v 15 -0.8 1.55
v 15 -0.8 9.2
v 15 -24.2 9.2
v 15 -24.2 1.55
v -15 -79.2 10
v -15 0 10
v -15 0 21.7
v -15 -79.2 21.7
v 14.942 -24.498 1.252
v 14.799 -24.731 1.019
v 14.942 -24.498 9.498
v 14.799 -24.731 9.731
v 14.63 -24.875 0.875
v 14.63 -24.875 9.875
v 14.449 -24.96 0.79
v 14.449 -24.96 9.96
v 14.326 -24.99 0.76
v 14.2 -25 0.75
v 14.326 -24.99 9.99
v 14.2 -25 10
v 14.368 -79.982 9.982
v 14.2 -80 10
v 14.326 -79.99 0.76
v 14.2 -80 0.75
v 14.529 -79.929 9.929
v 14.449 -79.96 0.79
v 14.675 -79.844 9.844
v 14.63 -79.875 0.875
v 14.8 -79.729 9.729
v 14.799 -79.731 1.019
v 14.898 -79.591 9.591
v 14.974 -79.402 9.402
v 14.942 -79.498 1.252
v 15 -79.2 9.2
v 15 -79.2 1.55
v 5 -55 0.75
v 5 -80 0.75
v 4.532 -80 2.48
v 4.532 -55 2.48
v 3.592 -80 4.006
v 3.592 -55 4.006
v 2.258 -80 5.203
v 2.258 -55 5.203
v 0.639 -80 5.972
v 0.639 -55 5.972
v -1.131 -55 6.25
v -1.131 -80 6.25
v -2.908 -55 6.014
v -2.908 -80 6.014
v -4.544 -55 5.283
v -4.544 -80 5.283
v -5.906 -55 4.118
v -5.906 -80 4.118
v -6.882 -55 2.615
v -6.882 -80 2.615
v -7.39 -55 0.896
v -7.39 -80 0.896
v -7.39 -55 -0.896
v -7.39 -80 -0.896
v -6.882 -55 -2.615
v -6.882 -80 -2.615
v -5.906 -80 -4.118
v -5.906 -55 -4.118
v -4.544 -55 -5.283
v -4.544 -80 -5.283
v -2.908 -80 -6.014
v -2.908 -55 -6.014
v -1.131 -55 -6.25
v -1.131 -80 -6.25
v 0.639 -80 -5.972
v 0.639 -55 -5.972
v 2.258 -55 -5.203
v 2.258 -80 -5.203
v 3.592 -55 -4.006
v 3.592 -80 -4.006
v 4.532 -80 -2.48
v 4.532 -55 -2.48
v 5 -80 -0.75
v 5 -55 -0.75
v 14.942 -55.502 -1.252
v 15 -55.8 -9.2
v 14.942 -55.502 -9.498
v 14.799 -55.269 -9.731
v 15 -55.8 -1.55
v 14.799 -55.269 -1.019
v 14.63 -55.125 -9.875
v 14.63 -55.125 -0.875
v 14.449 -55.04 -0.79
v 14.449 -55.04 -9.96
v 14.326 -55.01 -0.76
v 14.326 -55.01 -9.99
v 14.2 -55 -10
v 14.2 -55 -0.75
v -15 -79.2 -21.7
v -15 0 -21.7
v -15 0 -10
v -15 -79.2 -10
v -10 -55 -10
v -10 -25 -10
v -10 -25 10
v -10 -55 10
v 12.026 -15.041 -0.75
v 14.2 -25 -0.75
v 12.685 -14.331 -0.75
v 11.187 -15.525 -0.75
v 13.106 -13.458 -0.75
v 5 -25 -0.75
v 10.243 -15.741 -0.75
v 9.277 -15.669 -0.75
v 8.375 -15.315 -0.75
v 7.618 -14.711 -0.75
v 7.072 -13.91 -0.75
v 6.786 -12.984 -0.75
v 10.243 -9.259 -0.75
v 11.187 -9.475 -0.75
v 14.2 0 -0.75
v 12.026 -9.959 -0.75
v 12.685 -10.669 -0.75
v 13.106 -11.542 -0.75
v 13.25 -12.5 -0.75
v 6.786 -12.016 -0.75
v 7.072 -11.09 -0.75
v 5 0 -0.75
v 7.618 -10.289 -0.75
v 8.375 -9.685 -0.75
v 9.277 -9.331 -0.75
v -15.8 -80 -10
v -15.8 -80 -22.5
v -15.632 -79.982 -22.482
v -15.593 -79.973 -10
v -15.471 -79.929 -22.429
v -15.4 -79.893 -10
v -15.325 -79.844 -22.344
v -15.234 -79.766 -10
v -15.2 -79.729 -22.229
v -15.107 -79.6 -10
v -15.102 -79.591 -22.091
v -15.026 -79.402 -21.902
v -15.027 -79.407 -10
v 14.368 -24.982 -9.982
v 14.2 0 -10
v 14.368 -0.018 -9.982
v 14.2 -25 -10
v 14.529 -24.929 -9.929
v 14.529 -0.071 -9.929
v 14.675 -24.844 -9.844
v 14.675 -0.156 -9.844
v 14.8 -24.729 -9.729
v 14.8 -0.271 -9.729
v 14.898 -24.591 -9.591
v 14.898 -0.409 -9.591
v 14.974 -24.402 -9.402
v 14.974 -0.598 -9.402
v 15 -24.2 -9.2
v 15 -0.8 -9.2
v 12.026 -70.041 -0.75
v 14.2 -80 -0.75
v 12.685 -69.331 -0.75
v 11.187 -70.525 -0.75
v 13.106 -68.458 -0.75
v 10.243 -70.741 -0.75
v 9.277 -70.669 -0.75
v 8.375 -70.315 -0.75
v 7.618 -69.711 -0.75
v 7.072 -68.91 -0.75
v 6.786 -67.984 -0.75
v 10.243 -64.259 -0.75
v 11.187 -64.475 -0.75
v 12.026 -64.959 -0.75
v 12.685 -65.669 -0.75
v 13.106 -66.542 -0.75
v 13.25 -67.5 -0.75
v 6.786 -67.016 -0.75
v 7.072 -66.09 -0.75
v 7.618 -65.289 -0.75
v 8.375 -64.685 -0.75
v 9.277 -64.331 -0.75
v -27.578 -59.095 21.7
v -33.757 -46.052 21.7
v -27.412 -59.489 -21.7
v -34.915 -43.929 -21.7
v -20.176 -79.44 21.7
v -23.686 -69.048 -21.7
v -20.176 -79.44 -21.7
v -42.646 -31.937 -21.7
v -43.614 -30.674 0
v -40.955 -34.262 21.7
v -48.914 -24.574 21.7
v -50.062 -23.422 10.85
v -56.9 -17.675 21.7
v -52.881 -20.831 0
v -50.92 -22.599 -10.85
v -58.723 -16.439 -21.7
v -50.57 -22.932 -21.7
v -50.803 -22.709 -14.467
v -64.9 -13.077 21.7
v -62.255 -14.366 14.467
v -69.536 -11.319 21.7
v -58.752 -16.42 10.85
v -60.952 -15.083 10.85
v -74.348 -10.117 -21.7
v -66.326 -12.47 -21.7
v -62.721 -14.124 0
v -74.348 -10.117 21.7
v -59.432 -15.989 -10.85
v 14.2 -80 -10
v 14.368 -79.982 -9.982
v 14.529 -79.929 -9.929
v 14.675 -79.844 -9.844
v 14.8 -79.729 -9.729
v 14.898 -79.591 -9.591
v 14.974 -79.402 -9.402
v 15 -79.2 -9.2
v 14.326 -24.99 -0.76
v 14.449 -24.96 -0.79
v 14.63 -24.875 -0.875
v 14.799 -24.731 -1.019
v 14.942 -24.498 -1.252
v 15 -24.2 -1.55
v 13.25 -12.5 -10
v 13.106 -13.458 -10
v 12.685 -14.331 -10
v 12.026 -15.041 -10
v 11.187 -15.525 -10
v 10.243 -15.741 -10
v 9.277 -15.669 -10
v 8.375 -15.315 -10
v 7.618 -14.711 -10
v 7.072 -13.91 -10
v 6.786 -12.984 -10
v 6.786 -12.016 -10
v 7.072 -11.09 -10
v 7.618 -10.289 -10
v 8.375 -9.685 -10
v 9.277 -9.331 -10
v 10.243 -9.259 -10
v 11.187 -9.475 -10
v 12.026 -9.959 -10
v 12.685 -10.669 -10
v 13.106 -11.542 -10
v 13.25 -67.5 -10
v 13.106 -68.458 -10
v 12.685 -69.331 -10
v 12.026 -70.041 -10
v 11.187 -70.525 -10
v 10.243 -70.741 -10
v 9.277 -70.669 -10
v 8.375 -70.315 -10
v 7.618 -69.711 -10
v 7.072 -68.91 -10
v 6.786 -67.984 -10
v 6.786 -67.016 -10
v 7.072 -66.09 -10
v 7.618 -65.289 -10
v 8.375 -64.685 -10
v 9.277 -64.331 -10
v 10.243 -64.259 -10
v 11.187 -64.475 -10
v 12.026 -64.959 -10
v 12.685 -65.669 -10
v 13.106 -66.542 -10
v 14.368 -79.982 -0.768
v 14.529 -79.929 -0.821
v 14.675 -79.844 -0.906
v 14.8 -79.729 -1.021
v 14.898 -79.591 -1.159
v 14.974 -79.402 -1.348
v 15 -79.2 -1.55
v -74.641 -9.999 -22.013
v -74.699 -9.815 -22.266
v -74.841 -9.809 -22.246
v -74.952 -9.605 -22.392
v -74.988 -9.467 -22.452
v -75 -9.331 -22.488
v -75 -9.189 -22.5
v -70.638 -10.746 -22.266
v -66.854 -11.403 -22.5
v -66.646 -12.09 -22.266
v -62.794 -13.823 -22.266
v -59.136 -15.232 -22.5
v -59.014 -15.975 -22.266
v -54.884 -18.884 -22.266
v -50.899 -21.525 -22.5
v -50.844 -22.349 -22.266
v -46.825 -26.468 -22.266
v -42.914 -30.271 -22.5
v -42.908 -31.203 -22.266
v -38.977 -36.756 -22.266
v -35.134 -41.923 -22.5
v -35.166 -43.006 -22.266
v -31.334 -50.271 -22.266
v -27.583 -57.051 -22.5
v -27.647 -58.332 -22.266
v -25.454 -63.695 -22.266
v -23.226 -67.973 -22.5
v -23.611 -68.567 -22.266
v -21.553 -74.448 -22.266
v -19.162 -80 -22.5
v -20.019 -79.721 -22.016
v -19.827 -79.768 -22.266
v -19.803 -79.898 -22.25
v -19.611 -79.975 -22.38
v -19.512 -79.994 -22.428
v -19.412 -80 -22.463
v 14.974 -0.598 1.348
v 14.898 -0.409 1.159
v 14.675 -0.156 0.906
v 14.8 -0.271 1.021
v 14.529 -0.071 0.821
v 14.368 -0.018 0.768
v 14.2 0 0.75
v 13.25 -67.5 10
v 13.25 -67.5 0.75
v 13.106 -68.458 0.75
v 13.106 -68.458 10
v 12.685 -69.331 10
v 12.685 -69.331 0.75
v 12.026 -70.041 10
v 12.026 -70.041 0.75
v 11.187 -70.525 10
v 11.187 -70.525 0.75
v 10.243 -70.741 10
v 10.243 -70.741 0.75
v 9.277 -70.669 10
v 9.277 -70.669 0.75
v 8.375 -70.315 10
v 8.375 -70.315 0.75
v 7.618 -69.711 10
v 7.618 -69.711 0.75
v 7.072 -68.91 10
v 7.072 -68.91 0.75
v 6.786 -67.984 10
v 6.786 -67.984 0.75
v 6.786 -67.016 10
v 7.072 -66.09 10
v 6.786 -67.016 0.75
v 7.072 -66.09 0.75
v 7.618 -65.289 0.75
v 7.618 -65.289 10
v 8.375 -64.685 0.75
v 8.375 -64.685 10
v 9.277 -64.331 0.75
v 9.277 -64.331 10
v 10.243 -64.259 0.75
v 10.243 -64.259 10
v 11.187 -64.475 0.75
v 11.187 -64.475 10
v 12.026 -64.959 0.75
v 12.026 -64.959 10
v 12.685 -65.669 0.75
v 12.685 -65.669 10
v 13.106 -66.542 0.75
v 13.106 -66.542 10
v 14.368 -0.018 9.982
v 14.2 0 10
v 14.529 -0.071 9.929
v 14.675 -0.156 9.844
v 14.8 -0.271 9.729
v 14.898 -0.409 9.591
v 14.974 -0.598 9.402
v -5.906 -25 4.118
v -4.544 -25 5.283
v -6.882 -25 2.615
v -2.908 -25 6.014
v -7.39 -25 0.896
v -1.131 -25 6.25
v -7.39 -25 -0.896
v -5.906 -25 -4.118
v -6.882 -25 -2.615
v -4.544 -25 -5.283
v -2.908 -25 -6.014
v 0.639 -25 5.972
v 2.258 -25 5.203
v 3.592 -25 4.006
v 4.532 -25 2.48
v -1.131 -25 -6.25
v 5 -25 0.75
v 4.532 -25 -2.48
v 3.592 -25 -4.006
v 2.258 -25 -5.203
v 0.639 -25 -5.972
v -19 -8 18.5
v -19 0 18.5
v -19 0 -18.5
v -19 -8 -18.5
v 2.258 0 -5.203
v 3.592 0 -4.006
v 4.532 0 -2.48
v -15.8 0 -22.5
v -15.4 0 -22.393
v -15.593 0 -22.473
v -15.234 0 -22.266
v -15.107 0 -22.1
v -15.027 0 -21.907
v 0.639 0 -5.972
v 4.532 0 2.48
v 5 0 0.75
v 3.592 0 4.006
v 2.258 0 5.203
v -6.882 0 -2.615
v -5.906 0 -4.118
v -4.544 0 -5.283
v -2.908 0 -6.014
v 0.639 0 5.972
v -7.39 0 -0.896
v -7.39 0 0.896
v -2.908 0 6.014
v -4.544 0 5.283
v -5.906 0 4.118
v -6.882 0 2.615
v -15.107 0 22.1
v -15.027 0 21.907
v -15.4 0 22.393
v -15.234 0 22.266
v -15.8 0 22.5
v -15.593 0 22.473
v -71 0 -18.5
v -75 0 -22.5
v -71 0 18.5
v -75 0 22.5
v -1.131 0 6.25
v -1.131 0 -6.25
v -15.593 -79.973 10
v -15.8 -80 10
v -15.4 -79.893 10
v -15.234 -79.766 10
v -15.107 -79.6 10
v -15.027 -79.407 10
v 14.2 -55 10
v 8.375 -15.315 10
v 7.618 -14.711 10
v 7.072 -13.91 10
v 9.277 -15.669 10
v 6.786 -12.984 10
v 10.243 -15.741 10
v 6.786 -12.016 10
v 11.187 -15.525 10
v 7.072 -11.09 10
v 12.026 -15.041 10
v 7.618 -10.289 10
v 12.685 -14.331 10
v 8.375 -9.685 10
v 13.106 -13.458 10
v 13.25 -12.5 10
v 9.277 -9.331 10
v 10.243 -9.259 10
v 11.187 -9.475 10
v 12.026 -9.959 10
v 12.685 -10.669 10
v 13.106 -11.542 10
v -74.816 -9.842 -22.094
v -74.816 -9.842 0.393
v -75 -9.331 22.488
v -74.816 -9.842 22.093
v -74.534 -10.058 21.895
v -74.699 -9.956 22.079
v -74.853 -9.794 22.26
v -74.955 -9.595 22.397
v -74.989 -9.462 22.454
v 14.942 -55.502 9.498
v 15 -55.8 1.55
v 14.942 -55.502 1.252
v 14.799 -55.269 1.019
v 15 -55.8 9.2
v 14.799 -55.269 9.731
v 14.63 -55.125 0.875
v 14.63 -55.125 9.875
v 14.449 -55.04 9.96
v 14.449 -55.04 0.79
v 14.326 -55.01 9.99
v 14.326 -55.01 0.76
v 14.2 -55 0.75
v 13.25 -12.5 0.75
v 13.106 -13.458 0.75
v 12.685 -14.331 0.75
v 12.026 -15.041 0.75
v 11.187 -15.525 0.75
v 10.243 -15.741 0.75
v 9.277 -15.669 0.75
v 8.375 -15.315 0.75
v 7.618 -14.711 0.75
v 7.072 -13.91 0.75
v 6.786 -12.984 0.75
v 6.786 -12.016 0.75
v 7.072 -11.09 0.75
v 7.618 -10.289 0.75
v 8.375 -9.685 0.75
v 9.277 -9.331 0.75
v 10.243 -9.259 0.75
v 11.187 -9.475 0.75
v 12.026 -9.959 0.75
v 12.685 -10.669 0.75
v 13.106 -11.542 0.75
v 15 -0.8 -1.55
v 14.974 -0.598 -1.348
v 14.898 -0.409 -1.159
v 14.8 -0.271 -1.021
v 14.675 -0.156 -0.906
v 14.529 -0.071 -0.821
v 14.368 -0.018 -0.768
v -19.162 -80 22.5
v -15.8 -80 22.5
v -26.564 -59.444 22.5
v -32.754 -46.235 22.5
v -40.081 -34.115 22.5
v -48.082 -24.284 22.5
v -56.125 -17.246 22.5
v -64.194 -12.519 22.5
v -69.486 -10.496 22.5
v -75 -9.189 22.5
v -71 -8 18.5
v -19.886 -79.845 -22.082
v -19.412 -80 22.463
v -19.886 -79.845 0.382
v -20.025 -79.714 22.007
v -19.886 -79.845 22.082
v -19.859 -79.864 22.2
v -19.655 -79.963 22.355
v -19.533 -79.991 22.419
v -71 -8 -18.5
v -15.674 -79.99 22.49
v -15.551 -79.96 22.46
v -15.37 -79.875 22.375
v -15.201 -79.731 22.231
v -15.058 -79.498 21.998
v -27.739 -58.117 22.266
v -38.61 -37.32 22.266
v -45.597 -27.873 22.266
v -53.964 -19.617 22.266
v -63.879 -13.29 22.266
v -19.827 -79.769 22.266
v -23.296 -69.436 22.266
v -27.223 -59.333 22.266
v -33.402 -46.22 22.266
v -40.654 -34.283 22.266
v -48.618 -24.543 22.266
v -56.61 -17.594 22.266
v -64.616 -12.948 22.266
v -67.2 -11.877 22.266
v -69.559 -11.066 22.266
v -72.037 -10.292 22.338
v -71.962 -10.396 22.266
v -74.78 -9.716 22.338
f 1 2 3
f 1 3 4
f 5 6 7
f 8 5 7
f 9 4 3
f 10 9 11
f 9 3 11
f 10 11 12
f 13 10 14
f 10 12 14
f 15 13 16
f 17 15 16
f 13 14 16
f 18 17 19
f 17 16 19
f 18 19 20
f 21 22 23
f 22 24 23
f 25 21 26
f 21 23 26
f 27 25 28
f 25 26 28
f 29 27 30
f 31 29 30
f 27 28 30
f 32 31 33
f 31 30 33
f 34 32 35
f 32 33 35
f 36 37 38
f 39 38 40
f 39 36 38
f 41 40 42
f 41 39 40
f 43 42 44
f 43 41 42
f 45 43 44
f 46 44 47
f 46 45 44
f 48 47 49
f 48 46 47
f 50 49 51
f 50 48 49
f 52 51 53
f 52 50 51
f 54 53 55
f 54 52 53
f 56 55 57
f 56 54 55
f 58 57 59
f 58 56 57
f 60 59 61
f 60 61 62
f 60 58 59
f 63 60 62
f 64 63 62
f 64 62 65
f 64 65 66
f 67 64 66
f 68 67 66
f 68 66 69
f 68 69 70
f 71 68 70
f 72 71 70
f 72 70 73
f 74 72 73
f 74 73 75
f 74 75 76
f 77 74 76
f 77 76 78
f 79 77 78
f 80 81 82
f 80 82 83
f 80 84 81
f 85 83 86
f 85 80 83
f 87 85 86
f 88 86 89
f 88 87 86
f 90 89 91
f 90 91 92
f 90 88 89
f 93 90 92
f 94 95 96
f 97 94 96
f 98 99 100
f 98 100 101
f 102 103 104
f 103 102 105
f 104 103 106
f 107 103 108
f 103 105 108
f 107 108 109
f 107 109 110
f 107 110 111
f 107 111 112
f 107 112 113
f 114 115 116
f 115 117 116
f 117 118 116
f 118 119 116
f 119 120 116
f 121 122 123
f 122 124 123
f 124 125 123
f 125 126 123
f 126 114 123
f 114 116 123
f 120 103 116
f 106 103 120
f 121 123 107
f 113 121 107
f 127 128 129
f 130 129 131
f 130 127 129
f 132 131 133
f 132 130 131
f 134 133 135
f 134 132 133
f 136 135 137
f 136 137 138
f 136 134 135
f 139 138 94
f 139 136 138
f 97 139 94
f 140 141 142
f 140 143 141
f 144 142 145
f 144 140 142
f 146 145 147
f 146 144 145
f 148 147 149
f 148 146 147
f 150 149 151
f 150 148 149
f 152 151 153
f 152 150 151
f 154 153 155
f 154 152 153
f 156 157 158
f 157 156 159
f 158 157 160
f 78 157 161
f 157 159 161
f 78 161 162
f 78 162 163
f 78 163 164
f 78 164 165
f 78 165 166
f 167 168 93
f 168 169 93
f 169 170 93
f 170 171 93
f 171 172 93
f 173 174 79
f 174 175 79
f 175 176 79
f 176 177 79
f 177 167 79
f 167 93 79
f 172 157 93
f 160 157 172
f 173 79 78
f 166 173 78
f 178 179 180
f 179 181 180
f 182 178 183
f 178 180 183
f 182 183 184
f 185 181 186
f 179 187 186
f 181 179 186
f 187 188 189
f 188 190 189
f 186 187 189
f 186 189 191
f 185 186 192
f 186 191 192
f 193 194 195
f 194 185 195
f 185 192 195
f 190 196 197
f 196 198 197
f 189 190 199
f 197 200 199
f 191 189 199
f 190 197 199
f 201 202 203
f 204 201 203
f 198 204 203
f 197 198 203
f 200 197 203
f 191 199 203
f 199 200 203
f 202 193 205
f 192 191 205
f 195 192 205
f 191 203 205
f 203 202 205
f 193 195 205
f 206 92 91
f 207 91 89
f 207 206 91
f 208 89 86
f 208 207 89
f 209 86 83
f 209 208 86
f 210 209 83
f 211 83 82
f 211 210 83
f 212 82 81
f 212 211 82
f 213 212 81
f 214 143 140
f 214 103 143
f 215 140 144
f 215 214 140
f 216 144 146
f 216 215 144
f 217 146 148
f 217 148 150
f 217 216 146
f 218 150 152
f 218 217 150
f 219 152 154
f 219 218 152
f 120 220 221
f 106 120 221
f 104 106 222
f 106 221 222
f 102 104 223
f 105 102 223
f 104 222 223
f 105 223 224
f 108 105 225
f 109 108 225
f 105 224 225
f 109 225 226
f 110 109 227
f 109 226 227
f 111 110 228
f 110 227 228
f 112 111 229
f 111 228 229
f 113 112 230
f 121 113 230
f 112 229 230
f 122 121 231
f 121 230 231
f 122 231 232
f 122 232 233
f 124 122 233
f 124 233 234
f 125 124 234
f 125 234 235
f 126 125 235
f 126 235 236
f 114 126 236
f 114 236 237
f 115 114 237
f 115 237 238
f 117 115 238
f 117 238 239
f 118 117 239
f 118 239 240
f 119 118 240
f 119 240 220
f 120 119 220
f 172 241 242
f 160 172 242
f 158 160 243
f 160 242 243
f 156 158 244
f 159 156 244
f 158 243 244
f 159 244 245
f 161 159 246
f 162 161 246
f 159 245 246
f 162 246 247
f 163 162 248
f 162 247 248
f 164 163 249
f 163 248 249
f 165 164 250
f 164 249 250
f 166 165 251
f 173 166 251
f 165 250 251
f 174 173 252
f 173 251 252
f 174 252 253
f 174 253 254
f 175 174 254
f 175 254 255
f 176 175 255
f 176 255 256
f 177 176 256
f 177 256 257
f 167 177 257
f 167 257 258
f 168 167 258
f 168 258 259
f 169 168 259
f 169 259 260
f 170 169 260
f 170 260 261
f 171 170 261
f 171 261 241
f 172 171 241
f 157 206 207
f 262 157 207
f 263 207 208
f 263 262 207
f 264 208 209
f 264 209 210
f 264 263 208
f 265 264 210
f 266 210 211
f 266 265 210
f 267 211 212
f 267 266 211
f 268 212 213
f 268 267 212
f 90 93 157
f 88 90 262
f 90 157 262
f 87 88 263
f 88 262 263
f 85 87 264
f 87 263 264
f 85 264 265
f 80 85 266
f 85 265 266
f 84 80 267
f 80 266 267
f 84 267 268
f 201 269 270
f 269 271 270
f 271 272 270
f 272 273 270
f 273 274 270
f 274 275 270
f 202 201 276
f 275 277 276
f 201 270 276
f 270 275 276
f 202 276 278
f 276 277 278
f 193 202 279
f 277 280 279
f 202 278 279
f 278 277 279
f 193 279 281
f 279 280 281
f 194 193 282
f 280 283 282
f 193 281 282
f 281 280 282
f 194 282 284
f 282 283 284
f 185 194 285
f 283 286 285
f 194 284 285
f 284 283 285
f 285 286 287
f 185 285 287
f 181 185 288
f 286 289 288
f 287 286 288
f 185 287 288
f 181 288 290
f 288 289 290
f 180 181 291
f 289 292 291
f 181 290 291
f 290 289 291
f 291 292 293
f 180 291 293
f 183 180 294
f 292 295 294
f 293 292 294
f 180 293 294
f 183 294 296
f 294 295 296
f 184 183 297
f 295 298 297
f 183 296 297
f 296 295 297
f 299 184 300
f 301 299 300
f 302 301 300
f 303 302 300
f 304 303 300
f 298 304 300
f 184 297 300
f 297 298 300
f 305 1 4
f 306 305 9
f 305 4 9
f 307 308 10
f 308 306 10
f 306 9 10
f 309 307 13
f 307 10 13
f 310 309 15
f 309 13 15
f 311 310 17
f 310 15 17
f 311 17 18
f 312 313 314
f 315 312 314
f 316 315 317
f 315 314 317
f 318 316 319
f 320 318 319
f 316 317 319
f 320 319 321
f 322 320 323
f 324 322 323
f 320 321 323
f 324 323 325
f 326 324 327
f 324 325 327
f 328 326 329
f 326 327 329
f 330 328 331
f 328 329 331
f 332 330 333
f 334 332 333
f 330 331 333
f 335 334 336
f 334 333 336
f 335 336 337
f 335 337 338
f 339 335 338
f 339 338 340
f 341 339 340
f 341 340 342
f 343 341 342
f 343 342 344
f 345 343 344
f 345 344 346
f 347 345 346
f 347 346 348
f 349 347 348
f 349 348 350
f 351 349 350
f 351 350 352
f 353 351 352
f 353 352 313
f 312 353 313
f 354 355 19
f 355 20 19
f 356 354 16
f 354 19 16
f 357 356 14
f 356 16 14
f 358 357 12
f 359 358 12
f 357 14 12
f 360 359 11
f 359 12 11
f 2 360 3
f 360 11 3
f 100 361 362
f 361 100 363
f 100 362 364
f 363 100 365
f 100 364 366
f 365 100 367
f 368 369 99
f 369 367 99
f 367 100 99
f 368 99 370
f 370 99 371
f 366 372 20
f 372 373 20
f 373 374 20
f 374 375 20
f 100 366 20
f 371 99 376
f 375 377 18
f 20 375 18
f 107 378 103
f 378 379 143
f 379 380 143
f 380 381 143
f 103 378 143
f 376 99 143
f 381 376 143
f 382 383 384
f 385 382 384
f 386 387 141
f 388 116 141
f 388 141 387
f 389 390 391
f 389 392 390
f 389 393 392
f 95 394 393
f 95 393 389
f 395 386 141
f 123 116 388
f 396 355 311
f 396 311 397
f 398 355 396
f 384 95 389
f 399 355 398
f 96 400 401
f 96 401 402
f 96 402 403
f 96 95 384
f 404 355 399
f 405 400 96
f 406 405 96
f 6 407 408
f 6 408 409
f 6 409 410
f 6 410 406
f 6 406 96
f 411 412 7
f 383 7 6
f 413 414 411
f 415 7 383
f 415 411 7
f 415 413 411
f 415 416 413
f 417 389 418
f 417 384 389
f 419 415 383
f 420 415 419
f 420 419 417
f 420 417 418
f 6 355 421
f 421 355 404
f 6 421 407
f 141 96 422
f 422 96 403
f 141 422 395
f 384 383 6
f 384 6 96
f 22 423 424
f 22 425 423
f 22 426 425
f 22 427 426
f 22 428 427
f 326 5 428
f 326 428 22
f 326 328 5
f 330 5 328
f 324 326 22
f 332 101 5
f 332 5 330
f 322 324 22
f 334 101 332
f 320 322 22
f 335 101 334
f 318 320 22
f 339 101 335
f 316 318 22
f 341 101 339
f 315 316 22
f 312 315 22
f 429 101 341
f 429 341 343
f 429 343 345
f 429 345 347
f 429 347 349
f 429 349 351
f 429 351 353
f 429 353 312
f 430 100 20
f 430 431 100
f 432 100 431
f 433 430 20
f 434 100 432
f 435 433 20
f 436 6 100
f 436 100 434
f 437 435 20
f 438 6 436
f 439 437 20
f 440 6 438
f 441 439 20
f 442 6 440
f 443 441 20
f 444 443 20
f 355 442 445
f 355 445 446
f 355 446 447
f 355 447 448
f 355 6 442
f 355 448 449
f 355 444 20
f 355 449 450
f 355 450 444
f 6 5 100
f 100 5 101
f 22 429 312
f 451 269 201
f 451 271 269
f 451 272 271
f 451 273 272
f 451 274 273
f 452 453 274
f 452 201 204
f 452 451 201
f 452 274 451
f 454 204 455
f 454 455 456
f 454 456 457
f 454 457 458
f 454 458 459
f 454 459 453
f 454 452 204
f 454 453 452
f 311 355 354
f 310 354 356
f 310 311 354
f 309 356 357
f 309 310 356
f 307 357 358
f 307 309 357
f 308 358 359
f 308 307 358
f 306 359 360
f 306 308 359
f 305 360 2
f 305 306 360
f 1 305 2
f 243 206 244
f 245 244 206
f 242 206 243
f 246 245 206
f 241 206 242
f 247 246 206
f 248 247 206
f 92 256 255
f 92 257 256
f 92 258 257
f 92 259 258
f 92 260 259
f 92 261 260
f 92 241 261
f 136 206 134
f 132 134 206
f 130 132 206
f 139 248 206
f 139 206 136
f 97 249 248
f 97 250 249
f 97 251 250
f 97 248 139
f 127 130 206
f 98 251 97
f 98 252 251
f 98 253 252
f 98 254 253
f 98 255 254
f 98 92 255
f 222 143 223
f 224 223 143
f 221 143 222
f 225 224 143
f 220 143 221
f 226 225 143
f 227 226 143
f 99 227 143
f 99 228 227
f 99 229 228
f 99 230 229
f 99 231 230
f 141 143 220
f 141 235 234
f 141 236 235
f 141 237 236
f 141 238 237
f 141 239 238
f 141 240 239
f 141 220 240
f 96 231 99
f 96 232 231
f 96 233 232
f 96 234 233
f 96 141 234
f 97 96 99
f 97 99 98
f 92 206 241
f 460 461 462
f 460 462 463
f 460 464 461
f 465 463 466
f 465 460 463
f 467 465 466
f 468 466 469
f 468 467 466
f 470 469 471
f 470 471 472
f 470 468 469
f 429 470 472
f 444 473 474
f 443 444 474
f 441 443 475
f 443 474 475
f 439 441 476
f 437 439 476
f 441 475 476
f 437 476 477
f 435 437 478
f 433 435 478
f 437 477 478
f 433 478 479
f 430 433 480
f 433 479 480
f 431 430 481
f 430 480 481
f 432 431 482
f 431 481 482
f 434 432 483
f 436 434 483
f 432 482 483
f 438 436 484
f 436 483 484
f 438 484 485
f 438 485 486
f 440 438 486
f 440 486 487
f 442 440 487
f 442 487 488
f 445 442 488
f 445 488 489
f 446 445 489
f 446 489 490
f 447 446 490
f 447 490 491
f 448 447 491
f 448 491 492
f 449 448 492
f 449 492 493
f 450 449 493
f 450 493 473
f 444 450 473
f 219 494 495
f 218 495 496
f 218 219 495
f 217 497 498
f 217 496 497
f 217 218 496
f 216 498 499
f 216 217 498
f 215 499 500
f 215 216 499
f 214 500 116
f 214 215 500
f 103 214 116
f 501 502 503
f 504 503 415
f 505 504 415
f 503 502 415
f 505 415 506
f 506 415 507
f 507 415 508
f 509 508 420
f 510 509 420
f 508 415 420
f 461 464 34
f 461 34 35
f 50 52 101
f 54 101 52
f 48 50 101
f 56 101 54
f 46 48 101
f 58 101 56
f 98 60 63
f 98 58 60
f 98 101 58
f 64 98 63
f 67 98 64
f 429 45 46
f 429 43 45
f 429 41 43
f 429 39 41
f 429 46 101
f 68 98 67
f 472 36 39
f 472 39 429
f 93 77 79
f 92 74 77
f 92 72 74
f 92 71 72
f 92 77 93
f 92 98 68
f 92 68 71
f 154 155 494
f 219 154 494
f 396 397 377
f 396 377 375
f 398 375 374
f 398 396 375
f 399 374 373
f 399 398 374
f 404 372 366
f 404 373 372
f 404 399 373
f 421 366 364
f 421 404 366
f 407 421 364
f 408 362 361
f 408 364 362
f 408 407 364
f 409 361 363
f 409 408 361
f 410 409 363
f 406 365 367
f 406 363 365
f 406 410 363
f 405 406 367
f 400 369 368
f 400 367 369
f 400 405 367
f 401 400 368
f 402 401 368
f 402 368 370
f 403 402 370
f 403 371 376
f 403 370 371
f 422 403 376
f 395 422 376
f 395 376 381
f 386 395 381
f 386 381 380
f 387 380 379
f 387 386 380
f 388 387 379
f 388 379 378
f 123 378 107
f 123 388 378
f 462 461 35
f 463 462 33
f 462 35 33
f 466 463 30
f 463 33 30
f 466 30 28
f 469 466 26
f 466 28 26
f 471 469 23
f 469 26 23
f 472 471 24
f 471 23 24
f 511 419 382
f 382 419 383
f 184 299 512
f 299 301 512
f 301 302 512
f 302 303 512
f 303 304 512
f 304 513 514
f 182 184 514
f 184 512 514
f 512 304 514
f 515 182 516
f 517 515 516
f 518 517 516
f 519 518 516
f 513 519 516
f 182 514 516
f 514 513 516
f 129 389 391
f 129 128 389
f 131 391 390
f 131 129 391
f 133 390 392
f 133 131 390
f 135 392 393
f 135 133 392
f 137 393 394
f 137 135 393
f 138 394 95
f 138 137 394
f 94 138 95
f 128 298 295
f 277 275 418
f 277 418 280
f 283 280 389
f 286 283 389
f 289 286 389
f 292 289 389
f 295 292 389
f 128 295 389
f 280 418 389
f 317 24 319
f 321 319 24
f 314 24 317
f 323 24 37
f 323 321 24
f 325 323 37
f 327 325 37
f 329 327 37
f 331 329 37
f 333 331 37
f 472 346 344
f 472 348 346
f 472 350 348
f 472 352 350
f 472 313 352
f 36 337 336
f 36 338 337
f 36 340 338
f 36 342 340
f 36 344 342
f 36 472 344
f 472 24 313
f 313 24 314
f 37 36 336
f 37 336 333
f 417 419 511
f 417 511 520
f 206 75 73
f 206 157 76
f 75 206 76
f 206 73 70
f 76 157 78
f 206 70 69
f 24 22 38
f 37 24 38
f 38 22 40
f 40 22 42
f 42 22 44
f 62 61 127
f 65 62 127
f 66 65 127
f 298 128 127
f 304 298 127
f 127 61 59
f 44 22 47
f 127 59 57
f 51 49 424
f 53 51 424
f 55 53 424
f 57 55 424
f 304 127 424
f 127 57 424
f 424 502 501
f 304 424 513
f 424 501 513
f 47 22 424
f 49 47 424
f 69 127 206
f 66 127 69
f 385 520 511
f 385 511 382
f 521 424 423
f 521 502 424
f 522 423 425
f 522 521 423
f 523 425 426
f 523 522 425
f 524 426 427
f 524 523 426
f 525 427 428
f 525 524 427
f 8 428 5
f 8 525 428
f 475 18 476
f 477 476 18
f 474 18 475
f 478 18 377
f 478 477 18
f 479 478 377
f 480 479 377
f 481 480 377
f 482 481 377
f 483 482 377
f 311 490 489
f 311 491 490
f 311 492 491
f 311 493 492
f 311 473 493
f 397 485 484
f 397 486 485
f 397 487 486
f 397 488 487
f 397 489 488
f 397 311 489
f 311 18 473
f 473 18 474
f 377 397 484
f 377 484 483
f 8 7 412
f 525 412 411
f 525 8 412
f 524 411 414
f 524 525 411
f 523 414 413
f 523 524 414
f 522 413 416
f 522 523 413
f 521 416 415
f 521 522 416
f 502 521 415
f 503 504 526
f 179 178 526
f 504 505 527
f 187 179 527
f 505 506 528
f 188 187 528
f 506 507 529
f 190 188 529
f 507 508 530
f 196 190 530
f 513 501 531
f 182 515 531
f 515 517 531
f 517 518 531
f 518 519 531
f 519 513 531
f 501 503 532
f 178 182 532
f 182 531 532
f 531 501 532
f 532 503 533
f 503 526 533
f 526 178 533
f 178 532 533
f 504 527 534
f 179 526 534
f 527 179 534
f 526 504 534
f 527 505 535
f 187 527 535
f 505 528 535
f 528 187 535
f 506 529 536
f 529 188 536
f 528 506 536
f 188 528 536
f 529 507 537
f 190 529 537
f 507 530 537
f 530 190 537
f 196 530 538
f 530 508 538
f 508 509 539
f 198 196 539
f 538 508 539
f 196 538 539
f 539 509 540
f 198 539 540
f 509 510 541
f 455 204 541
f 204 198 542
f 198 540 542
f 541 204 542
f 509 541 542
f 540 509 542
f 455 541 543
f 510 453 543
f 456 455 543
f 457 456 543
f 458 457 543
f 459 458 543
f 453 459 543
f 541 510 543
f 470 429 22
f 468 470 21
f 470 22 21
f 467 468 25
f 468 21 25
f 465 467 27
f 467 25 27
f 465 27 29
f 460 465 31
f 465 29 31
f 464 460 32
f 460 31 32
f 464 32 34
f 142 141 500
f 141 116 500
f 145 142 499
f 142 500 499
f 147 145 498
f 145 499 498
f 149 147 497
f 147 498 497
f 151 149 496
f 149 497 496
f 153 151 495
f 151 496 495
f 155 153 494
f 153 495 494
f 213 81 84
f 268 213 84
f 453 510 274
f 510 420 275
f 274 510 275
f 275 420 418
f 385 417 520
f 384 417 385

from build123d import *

# Parameters (mm, degrees)
PAD_DEPTH       = 80
SKETCH001_W     = 25
SKETCH001_H     = 30
SKETCH001_R     = 3.25
POCKET_DEPTH    = 45.001
FILLET_R        = 0.8
SKETCH002_W     = 52
SKETCH002_H     = 37
POCKET001_DEPTH = 8
FILLET001_R     = 0.8
FILLET002_R     = 0.8


with BuildPart() as part:
    # Sketch → Pad (new body)
    with BuildSketch(Plane.XZ):
        with BuildLine():
            Line((-15, 10), (15, 10))
            Line((15, 10), (15, 0.75))
            Line((15, 0.75), (5, 0.75))
            ThreePointArc((5, 0.75), (-7.454837, 0), (5, -0.75))
            Line((15, -0.75), (5, -0.75))
            Line((15, -10), (15, -0.75))
            Line((15, -10), (-15, -10))
            Line((-15, -22.5), (-15, -10))
            Line((-75, -22.5), (-15, -22.5))
            Line((-75, 22.5), (-75, -22.5))
            Line((-15, 22.5), (-75, 22.5))
            Line((-15, 10), (-15, 22.5))
        make_face()
    extrude(amount=PAD_DEPTH)

    # Sketch001 (on Face9 of Pad) → Pocket (cut, through all)
    with BuildSketch(Plane(origin=(0, 0, -22.5), x_dir=(1, 0, 0), z_dir=(0, 0, -1))):
        with Locations((2.5, 40)):
            Rectangle(SKETCH001_W, SKETCH001_H)
        with BuildLine():
            Line((-20, 80), (-75, 80))
            Line((-75, 80), (-75, 10))
            add(Edge.make_bspline(
                [(-75, 10), (-40, 16), (-20, 80)],
                knots=[0, 0, 0, 1, 1, 1], degree=2))
        make_face()
        with Locations((10, 12.5)):
            Circle(SKETCH001_R)
        with Locations((10, 67.5)):
            Circle(SKETCH001_R)
    extrude(amount=-POCKET_DEPTH, mode=Mode.SUBTRACT)

    # Fillet
    fillet_edges = [part.edges().sort_by_distance(p)[0] for p in [
        (-38.841084, -37.393675, -22.5),
        (-20, -80, 0),
        (-38.841077, -37.393686, 22.5),
        (-75, -10, 0),
    ]]
    fillet(fillet_edges, radius=FILLET_R)

    # Sketch002 (on Face17 of Fillet) → Pocket001 (cut)
    with BuildSketch(Plane(origin=(0, 0, 0), x_dir=(1, 0, 0), z_dir=(0, 1, 0))):
        with Locations((-45, 0)):
            Rectangle(SKETCH002_W, SKETCH002_H)
    extrude(amount=-POCKET001_DEPTH, mode=Mode.SUBTRACT)

    # Fillet001
    fillet001_edges = [part.edges().sort_by_distance(p)[0] for p in [
        (15, 0, 5.375),
        (15, -12.5, 0.75),
        (15, -25, 5.375),
        (15, -12.5, 10),
        (15, 0, -5.375),
        (15, -12.5, -0.75),
        (15, -25, -5.375),
        (15, -12.5, -10),
        (15, -55, 5.375),
        (15, -67.5, 0.75),
        (15, -80, 5.375),
        (15, -67.5, 10),
        (15, -55, -5.375),
        (15, -67.5, -0.75),
        (15, -80, -5.375),
        (15, -67.5, -10),
    ]]
    fillet(fillet001_edges, radius=FILLET001_R)

    # Fillet002
    fillet002_edges = [part.edges().sort_by_distance(p)[0] for p in [
        (-15, -40, 22.5),
        (-15, -80, 16.25),
        (-15, -80, -16.25),
        (-15, -40, -22.5),
    ]]
    fillet(fillet002_edges, radius=FILLET002_R)


solid = part.part
